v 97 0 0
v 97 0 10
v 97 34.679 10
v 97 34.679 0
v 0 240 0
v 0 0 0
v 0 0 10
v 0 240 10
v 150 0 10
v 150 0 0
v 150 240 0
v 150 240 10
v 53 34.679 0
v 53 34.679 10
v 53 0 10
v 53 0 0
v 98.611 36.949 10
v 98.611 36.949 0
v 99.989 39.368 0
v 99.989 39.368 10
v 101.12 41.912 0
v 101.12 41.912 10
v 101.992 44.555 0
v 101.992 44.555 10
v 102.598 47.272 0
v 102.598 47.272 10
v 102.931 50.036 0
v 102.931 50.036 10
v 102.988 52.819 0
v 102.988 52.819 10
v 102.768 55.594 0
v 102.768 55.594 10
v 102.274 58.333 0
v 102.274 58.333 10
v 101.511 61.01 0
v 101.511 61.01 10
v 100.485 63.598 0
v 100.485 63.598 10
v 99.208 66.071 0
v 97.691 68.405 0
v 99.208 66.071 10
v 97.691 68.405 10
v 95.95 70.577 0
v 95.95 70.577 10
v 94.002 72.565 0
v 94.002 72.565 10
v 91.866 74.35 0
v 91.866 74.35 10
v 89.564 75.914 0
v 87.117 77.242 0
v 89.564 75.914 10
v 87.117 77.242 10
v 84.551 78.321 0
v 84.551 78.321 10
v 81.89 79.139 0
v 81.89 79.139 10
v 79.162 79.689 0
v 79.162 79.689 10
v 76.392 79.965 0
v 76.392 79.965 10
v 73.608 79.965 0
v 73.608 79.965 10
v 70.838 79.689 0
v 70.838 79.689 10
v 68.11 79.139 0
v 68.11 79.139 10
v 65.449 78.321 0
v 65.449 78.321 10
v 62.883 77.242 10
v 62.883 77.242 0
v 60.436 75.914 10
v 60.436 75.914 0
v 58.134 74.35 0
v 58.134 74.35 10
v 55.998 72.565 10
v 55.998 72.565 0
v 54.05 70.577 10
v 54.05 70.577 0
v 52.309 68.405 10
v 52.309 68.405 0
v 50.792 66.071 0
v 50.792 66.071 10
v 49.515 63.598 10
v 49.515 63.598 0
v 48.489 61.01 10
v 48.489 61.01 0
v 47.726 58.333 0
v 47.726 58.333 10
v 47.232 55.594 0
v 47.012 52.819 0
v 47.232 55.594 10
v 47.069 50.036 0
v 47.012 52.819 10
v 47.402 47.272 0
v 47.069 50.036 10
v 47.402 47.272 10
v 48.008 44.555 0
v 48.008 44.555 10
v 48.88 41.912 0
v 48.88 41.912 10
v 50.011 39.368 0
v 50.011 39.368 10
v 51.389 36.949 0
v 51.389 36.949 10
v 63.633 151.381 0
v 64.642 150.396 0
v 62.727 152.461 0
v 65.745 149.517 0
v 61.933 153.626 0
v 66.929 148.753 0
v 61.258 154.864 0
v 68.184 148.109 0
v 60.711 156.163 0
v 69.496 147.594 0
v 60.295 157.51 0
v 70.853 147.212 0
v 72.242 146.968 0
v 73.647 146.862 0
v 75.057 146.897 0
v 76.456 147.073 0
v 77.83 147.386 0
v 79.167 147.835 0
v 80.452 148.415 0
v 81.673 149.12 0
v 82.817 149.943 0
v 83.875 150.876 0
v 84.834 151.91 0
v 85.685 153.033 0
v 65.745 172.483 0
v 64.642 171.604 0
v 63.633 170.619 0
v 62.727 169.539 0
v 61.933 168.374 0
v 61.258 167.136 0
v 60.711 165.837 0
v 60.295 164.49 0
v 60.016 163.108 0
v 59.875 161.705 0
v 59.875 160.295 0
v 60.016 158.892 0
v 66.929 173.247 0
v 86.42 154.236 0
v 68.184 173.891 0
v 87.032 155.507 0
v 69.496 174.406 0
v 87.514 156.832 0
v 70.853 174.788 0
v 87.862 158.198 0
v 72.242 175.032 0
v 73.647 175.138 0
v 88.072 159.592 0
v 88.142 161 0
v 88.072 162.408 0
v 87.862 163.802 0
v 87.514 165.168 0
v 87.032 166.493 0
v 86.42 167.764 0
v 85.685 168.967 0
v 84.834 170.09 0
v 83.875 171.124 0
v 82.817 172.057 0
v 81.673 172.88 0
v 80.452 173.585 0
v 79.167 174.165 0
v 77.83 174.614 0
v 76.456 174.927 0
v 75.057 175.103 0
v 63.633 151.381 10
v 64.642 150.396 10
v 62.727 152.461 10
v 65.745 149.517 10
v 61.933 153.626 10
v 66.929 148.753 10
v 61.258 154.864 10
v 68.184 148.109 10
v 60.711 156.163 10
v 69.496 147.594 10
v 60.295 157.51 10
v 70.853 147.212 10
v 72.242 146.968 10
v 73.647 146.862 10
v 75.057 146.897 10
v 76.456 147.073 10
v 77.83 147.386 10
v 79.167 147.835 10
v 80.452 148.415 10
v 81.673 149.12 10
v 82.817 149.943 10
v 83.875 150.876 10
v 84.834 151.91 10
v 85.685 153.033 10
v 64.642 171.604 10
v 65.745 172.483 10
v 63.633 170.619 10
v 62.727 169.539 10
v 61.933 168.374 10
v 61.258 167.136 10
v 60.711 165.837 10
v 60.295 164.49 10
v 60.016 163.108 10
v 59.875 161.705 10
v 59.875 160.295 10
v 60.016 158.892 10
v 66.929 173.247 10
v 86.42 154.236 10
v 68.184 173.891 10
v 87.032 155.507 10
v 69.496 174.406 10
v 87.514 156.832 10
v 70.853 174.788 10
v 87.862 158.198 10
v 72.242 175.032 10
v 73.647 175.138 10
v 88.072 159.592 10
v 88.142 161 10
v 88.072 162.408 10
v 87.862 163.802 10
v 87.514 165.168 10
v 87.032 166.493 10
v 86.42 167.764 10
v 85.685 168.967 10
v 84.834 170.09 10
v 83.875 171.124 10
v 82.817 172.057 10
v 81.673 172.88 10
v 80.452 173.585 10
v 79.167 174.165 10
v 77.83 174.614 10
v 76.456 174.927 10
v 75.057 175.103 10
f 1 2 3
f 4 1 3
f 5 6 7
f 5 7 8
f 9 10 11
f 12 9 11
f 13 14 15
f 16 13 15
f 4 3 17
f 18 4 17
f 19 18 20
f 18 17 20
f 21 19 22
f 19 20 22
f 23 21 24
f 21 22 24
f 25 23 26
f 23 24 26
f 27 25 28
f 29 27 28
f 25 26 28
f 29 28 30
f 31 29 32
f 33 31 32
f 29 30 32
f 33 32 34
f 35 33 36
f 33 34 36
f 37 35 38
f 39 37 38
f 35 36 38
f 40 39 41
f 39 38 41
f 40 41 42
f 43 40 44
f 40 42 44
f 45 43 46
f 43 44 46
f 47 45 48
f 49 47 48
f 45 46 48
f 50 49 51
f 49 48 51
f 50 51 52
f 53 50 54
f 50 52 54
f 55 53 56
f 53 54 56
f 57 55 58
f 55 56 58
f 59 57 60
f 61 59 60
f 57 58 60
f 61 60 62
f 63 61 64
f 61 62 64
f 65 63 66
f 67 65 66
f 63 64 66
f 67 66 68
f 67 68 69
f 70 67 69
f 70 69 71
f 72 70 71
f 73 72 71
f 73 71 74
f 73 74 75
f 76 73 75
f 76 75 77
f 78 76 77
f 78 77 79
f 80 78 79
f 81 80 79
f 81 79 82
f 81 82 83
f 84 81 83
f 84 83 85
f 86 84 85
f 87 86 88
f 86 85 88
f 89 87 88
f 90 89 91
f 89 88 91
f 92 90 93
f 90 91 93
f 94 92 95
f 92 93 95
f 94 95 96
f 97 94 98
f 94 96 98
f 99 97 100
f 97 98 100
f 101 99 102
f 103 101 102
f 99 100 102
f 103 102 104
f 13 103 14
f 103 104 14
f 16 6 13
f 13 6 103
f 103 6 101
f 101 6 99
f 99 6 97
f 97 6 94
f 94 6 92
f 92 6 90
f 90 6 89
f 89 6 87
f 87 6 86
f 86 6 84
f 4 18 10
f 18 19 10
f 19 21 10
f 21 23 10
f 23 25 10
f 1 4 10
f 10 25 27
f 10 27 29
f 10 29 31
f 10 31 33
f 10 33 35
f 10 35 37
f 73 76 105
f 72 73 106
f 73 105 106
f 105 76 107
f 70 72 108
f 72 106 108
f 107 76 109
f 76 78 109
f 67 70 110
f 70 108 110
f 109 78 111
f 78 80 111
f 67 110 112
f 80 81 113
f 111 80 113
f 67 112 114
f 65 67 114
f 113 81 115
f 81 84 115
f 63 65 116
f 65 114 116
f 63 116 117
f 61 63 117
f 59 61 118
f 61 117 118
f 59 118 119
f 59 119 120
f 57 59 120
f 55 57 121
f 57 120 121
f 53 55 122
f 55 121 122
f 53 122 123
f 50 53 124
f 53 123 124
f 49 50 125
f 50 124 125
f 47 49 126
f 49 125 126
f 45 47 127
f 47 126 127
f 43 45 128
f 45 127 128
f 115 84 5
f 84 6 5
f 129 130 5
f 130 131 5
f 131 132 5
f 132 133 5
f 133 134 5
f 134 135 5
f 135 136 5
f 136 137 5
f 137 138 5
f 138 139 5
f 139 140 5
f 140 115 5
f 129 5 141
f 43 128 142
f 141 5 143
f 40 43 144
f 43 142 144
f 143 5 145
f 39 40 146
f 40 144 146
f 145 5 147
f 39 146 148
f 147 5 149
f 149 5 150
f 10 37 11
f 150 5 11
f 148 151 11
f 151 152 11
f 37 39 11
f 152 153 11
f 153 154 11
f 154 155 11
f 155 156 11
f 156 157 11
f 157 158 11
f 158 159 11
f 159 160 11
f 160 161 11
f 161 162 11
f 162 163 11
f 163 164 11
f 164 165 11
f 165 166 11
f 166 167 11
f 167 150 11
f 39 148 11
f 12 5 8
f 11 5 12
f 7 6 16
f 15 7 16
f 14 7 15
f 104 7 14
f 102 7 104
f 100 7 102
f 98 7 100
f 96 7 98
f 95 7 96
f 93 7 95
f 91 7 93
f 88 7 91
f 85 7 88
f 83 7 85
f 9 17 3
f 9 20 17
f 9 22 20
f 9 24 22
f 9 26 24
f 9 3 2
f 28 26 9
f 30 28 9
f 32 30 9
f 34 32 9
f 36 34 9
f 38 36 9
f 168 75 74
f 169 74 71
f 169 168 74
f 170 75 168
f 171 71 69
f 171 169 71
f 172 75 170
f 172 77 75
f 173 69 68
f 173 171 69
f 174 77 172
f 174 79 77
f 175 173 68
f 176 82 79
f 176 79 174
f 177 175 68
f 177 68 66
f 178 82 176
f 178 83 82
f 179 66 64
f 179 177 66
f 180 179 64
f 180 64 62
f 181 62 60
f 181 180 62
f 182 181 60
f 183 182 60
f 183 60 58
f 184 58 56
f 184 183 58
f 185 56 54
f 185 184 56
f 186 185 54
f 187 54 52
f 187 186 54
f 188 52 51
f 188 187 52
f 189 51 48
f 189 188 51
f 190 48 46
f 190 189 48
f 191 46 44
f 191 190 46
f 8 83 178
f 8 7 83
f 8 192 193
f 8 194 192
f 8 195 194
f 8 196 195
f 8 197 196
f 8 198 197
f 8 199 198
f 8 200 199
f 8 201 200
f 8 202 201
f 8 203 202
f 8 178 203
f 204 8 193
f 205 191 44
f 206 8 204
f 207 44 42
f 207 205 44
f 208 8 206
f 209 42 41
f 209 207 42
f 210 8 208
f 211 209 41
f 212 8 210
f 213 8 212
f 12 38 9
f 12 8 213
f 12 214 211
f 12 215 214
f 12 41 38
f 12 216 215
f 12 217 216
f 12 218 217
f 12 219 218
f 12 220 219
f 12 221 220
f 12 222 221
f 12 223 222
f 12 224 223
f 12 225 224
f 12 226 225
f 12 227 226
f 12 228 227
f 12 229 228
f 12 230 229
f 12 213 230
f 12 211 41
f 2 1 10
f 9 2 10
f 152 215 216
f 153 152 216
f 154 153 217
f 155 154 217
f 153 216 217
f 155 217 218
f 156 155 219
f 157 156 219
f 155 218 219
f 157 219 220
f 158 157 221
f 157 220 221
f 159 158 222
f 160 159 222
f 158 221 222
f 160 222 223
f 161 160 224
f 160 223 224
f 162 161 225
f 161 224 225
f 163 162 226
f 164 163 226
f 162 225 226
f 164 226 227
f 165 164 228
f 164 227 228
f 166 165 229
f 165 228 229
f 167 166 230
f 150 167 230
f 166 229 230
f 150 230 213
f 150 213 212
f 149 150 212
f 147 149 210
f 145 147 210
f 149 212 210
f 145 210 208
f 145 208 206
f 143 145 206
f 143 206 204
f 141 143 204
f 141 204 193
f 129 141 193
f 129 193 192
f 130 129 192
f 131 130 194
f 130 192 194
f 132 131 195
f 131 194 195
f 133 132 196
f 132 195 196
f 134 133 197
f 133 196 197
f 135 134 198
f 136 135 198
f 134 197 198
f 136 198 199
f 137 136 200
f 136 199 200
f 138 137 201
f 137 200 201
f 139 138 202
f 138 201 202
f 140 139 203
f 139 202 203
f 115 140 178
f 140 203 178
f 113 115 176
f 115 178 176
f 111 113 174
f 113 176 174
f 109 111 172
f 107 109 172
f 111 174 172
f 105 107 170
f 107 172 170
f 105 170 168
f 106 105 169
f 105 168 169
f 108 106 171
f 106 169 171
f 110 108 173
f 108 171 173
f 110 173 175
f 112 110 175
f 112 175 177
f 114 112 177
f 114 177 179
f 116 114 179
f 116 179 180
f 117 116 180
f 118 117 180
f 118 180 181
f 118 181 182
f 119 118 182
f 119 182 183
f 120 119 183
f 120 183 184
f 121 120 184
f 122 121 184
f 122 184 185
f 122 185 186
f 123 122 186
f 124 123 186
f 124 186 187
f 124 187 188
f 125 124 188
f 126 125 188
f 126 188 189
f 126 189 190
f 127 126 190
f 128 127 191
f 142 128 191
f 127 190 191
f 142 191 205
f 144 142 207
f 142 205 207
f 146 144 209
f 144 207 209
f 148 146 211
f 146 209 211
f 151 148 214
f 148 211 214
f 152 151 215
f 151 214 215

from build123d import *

# Parameters (mm, degrees)
ESQUISSE1_W             = 150
ESQUISSE1_H             = 240
BASE_EXTRUSION_DEPTH    = 10
ENL_V_MAT_EXTRU_1_DEPTH = 10
ESQUISSE3_R             = 14.142135624
ENL_V_MAT_EXTRU_2_DEPTH = 10


with BuildPart() as part:
    # Esquisse1 → Base-Extrusion (new body)
    with BuildSketch(Plane.XY):
        with Locations((75, 120)):
            Rectangle(ESQUISSE1_W, ESQUISSE1_H)
    extrude(amount=BASE_EXTRUSION_DEPTH)

    # Esquisse2 → Enlèv. mat.-Extru.1 (cut)
    with BuildSketch(Plane.XY.offset(10)):
        with BuildLine():
            Line((53, 0), (97, 0))
            Line((97, 0), (97, 34.679491924))
            ThreePointArc((97, 34.679491924), (75, 80), (53, 34.679491924))
            Line((53, 34.679491924), (53, 0))
        make_face()
    extrude(amount=-ENL_V_MAT_EXTRU_1_DEPTH, mode=Mode.SUBTRACT)

    # Esquisse3 → Enlèv. mat.-Extru.2 (cut)
    with BuildSketch(Plane.XY.offset(10)):
        with Locations((74, 161)):
            Circle(ESQUISSE3_R)
    extrude(amount=-ENL_V_MAT_EXTRU_2_DEPTH, mode=Mode.SUBTRACT)


solid = part.part
